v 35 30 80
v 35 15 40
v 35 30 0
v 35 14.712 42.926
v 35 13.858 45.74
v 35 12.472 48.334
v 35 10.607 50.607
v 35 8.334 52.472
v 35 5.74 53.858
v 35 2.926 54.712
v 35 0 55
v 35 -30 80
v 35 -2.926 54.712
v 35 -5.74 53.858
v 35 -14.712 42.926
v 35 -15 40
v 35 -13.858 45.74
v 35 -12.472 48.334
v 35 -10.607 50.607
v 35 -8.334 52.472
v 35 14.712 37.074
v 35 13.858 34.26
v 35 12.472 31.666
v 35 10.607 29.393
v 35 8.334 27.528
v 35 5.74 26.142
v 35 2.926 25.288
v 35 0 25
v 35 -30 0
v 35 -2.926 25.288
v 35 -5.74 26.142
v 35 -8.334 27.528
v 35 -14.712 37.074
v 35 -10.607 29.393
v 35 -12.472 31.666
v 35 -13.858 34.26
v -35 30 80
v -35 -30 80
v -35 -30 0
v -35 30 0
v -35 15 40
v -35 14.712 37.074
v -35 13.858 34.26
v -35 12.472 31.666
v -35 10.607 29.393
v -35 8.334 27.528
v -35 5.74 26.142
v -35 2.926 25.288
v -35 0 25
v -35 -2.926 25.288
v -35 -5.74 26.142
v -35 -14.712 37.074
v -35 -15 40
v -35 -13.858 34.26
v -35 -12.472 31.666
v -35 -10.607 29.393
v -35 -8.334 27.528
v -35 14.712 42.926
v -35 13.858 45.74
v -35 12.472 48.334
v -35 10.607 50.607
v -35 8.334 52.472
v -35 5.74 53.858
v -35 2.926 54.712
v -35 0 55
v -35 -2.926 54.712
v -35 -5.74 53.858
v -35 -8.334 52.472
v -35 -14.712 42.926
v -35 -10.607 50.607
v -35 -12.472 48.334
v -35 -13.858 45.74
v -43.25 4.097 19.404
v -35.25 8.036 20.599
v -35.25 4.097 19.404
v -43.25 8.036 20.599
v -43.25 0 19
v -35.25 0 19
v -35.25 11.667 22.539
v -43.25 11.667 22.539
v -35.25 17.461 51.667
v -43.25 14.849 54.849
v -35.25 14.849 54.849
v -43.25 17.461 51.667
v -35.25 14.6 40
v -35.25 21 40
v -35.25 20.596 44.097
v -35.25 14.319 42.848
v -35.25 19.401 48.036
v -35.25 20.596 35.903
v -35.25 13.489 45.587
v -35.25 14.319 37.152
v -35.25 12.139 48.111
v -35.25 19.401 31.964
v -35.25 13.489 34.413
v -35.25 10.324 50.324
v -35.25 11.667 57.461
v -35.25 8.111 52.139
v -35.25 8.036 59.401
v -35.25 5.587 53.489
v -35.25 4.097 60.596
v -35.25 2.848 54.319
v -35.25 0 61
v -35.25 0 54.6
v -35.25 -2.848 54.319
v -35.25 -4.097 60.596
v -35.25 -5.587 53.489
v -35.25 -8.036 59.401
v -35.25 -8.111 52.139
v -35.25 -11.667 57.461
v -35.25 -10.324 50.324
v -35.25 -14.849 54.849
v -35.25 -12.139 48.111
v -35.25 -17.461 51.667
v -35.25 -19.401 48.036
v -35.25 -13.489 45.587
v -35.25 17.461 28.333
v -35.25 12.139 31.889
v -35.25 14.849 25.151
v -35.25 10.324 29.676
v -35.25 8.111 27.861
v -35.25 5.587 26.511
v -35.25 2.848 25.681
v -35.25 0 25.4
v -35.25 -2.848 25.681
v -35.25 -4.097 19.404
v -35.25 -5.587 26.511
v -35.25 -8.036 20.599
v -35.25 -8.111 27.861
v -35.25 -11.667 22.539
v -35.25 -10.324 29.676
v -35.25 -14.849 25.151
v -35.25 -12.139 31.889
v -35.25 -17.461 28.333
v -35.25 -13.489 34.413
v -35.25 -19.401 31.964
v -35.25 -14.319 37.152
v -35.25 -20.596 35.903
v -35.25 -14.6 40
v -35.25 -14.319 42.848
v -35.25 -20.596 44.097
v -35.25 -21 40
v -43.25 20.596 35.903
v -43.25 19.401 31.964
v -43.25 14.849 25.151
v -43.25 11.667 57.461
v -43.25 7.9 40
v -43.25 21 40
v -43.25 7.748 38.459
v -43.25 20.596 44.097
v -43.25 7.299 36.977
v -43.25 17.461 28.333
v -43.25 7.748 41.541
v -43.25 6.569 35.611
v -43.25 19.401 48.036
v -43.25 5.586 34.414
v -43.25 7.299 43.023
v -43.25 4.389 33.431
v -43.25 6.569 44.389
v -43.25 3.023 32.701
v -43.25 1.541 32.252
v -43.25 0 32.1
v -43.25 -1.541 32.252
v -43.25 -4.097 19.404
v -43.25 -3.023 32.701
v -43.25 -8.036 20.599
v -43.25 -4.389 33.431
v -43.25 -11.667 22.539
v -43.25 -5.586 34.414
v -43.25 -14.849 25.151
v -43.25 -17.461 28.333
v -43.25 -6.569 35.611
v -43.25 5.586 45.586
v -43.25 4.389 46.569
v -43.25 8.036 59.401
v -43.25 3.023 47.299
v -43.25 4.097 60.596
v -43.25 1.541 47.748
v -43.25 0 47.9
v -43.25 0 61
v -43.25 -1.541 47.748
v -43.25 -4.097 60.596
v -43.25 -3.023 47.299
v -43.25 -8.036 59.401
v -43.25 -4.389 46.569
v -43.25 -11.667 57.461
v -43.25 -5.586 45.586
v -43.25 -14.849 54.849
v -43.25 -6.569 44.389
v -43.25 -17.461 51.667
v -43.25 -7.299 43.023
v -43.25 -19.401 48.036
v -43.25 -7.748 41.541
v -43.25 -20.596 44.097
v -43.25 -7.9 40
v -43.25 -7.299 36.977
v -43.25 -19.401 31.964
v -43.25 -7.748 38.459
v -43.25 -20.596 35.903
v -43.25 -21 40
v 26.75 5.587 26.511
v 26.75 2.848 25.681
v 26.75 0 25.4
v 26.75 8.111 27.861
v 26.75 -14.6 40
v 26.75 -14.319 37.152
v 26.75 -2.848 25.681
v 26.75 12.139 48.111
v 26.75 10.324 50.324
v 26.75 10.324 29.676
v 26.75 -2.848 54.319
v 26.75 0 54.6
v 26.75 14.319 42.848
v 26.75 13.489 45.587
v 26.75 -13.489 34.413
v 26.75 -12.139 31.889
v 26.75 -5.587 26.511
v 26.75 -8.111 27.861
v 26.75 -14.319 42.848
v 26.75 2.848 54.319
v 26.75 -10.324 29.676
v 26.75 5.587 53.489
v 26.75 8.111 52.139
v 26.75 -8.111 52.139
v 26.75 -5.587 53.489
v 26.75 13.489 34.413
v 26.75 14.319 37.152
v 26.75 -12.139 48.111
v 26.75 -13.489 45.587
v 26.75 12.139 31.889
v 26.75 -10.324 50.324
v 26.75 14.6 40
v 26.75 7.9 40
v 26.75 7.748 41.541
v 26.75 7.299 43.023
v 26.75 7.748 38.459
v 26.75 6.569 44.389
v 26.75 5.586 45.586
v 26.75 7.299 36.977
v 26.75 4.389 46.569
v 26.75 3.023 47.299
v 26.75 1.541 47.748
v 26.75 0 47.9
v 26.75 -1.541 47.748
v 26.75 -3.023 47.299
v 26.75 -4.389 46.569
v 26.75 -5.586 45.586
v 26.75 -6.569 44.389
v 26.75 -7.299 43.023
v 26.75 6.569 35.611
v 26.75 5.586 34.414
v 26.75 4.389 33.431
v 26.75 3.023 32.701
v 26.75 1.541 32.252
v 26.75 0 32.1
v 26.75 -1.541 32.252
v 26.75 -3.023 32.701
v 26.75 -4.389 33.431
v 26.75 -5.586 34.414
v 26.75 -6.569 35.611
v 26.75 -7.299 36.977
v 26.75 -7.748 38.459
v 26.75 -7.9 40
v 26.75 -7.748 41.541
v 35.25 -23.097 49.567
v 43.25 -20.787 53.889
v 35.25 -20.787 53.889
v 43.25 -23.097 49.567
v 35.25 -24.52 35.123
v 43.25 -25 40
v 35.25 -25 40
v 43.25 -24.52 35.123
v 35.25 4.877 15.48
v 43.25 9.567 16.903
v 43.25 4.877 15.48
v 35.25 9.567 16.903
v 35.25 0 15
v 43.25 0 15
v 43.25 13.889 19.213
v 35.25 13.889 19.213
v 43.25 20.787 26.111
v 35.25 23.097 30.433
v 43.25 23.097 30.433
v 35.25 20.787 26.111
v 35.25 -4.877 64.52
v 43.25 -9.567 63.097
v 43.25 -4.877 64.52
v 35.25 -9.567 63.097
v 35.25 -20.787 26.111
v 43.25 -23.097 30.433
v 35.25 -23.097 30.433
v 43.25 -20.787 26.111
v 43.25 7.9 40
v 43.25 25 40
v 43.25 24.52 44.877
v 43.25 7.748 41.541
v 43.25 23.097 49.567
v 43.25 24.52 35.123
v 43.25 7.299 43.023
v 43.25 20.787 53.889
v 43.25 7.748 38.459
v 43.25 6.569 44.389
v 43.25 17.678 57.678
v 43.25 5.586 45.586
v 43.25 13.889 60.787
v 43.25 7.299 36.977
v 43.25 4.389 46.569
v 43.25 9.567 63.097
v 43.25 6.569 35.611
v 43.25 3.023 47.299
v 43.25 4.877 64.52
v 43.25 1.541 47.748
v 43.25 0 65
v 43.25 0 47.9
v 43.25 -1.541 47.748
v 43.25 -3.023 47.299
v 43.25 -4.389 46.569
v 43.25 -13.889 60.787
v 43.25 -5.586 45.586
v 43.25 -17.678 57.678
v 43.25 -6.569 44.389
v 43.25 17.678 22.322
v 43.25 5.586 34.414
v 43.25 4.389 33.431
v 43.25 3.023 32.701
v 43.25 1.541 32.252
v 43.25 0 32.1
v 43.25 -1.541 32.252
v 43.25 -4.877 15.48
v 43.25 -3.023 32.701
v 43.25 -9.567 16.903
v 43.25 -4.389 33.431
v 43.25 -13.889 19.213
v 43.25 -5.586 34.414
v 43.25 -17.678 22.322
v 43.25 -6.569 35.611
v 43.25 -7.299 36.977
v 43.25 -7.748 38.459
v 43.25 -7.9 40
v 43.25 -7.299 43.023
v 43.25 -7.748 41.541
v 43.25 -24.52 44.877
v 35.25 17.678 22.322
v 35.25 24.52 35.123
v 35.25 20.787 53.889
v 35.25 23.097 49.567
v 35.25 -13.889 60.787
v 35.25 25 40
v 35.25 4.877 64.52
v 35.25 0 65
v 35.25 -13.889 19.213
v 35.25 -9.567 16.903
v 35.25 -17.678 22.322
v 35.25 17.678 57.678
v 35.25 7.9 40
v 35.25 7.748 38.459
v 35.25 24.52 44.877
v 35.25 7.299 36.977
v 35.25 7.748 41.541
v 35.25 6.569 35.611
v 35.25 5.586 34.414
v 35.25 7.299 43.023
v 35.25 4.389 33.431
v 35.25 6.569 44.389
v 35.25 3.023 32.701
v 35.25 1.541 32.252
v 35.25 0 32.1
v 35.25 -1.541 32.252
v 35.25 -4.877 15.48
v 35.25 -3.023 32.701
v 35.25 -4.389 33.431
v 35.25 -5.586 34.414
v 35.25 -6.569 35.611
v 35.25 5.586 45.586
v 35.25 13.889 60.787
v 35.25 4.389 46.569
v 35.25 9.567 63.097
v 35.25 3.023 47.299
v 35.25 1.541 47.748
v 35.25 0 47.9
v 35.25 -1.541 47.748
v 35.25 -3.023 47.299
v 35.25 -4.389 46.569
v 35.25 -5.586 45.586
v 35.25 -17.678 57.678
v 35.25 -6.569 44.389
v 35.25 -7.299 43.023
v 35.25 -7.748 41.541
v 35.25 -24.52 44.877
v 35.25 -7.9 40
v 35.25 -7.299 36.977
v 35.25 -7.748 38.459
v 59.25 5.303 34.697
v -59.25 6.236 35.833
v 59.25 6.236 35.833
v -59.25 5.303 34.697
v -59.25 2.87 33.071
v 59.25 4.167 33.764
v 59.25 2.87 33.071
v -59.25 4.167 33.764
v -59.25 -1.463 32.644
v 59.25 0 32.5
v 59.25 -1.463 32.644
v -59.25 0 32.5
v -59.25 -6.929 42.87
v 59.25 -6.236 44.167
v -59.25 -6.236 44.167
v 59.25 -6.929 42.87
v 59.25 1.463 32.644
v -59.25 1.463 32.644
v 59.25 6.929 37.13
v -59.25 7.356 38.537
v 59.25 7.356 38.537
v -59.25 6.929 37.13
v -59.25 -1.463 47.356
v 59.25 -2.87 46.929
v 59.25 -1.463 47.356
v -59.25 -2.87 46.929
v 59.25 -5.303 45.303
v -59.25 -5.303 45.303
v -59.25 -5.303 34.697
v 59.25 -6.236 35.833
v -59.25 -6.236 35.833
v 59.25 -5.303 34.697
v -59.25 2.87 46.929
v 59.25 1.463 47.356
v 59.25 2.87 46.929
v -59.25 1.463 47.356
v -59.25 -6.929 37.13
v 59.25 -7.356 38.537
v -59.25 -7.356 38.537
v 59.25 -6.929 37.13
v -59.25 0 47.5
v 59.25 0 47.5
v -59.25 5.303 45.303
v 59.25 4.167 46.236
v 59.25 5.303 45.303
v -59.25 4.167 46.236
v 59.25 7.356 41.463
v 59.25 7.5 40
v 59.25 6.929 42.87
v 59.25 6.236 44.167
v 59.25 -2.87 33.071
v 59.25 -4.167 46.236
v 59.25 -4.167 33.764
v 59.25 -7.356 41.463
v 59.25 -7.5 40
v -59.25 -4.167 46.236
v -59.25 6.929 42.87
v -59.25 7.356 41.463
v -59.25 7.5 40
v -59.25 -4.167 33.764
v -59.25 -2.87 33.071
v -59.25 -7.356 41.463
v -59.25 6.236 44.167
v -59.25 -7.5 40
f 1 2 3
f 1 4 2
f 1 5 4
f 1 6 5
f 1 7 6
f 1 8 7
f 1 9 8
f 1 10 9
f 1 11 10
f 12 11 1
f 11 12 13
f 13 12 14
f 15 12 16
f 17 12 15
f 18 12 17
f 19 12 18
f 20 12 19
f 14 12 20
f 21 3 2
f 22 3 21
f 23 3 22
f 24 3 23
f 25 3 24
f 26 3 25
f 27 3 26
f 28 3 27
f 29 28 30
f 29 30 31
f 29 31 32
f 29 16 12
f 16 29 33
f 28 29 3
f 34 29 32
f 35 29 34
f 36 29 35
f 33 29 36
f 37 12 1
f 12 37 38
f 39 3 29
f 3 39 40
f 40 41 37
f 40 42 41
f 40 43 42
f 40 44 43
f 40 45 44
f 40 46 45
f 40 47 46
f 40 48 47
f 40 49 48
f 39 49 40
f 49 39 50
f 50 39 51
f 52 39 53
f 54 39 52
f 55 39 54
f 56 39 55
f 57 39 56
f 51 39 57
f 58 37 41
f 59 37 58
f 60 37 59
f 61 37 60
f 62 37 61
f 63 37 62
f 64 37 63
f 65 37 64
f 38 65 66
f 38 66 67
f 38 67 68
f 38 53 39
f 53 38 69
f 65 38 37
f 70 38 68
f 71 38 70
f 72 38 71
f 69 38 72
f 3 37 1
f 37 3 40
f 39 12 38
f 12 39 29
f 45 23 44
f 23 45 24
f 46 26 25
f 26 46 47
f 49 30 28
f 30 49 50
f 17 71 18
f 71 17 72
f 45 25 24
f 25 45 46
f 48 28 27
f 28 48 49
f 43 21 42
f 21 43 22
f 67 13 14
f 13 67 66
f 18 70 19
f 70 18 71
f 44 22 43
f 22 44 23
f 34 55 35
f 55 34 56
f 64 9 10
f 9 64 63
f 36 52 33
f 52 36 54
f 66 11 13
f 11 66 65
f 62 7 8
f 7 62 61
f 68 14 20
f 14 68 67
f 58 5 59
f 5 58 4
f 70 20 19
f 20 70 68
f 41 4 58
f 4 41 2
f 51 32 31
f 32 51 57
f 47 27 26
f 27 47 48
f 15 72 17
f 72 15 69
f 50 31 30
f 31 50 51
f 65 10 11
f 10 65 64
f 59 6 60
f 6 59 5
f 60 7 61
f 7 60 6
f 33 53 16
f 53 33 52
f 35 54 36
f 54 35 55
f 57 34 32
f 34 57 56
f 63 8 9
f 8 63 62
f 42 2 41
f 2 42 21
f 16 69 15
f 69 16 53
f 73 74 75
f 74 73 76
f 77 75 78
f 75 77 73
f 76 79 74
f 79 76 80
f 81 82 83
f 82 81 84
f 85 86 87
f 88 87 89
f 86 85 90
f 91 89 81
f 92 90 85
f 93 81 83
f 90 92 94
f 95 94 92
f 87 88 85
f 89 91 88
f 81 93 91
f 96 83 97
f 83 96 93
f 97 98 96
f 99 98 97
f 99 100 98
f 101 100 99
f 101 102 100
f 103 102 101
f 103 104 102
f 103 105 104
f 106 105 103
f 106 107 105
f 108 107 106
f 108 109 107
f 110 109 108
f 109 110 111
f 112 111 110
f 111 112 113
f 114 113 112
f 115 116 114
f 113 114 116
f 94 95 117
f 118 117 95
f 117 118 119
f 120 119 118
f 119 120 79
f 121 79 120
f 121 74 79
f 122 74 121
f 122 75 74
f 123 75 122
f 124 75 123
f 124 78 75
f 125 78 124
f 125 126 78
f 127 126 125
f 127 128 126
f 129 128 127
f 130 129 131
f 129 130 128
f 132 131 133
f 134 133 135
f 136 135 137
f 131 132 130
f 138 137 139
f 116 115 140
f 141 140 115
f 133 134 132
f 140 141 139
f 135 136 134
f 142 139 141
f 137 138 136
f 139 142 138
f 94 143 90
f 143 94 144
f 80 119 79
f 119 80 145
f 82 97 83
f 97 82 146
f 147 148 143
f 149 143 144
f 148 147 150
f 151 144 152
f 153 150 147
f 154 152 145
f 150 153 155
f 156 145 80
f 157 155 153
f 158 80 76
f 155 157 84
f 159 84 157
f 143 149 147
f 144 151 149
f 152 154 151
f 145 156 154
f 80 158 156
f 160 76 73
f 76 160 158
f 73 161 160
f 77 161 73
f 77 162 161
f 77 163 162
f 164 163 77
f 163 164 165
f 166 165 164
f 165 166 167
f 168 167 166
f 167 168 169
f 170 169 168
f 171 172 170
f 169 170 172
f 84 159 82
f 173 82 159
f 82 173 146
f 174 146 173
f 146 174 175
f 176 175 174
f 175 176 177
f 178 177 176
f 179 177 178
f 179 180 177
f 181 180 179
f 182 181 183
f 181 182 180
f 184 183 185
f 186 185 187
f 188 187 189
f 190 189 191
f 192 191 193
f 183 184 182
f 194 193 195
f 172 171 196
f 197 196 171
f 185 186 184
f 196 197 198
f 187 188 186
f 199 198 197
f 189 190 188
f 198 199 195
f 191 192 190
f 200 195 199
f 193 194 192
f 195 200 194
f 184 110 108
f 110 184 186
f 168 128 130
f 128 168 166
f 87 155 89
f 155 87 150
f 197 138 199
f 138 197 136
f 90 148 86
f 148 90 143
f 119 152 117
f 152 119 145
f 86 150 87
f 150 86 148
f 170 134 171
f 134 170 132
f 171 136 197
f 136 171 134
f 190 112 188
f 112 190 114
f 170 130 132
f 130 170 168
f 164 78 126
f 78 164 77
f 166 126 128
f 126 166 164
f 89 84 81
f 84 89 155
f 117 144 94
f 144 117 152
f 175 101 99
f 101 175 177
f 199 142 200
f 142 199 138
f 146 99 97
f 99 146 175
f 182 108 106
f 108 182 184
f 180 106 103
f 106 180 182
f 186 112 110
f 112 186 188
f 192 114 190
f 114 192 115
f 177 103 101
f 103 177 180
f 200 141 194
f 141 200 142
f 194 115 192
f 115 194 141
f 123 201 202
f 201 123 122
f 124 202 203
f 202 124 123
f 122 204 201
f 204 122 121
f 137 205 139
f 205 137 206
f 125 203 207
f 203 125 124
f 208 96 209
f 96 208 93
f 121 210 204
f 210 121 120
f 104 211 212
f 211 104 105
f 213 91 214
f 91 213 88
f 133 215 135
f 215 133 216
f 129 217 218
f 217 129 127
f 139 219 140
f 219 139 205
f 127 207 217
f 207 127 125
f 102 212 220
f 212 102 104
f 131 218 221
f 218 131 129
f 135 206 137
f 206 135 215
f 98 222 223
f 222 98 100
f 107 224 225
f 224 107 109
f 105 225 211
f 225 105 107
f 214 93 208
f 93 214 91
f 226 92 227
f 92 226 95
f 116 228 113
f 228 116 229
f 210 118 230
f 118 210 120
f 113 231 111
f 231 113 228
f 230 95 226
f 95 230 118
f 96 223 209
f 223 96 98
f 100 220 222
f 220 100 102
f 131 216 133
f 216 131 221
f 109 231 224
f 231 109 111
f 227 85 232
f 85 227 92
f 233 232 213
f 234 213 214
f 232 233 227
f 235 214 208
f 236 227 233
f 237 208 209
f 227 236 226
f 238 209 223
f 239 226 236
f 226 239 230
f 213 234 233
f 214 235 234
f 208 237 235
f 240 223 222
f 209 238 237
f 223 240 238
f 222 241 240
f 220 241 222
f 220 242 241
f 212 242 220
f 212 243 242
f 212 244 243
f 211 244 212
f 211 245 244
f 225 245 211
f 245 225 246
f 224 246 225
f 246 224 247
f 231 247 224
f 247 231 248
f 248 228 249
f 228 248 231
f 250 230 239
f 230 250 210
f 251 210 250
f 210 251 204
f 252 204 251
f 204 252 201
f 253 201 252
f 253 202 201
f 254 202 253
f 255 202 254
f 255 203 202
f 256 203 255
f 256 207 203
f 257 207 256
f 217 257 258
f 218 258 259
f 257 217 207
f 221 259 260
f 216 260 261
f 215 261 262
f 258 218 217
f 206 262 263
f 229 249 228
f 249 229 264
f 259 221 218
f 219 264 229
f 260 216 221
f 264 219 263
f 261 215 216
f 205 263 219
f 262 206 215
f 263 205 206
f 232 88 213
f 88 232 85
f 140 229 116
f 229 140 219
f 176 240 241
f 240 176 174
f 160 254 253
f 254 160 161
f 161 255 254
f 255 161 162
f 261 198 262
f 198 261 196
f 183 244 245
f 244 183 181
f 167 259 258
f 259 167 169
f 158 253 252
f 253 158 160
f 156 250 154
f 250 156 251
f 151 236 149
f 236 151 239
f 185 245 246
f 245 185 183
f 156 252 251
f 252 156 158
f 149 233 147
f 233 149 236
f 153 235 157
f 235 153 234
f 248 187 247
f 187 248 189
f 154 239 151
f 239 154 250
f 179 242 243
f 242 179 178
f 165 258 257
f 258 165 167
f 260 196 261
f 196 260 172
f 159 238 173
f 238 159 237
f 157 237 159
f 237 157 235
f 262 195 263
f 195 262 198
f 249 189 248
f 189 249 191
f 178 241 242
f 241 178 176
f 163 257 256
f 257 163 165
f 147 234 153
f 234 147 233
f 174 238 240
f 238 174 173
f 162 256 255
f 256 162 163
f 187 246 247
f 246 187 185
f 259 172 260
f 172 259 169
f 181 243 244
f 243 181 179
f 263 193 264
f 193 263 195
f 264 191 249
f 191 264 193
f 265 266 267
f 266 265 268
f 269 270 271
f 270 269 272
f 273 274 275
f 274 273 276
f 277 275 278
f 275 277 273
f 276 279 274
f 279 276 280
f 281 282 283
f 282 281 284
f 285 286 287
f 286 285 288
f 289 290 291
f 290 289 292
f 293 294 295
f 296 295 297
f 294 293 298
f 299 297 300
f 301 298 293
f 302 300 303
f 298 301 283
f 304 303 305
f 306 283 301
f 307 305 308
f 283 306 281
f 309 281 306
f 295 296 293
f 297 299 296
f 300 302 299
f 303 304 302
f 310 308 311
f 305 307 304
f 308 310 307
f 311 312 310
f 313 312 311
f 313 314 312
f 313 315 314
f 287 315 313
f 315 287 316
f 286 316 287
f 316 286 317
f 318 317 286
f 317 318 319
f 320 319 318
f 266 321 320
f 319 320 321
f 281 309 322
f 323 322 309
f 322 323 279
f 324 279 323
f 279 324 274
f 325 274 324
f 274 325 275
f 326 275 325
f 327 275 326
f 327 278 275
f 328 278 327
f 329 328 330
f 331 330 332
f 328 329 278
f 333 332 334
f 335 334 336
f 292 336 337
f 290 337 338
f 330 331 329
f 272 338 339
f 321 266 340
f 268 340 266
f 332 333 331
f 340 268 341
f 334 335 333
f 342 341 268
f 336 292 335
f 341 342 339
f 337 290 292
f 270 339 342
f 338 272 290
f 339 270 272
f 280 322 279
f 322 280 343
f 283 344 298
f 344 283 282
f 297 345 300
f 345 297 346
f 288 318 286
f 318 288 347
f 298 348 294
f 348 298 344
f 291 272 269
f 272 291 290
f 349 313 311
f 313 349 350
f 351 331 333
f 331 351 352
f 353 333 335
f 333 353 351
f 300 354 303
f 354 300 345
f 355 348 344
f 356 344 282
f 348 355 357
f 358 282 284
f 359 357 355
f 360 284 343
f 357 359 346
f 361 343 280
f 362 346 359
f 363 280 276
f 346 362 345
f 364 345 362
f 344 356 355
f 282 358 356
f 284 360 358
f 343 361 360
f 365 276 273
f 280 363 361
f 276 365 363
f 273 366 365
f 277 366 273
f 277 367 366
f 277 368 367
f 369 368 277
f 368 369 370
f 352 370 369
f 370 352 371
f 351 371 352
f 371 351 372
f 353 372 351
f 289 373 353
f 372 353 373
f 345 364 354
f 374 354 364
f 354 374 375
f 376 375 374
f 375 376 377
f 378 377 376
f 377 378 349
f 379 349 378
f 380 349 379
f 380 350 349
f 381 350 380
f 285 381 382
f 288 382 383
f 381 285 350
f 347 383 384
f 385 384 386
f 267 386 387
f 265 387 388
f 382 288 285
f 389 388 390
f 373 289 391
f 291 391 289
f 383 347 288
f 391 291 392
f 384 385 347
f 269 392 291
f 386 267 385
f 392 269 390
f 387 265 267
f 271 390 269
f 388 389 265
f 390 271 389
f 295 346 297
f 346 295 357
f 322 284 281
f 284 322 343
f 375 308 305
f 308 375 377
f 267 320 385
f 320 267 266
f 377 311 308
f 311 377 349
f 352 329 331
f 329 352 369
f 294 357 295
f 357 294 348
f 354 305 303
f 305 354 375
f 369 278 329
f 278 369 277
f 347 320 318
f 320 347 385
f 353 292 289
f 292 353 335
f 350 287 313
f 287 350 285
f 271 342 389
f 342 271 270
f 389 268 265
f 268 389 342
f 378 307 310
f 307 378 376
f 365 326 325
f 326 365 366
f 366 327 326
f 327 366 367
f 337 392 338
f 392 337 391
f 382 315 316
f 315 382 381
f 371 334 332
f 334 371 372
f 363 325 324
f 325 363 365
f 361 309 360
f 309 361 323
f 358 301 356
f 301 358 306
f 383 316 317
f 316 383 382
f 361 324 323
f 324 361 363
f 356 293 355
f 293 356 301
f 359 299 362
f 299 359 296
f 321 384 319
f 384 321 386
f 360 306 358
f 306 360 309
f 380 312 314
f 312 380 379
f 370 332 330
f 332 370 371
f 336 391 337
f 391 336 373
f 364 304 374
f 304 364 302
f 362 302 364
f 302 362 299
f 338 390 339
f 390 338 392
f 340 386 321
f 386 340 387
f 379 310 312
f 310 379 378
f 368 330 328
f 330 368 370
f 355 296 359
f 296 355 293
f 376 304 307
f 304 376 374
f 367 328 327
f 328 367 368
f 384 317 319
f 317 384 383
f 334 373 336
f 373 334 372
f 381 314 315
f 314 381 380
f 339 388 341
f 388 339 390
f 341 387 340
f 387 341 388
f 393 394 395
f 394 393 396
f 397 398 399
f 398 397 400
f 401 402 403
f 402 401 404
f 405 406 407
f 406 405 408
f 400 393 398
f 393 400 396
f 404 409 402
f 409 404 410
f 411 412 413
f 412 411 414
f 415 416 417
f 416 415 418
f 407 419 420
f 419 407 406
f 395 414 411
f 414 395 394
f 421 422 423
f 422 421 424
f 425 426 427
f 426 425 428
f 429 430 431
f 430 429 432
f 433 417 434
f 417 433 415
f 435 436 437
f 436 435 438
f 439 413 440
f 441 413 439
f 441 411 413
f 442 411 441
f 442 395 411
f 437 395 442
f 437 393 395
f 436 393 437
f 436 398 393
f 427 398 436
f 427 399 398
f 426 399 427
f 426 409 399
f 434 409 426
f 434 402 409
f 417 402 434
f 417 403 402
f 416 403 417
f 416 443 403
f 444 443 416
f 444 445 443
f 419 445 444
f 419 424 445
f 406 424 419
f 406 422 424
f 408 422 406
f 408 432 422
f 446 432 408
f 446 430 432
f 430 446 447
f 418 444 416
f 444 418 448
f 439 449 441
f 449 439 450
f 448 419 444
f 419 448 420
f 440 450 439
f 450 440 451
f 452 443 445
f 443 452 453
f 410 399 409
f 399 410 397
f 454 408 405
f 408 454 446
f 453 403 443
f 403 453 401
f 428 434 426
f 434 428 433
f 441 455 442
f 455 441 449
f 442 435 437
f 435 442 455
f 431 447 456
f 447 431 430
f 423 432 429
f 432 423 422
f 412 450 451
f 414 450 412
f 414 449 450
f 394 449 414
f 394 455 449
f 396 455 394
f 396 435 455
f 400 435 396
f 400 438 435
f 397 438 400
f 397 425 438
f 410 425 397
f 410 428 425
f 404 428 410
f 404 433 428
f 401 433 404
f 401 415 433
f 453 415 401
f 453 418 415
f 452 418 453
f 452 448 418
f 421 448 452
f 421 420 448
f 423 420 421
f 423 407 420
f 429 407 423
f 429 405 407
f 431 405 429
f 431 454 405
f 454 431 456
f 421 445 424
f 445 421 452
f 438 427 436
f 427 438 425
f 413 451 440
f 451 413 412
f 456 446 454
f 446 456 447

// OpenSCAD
$fn = 32;

// ------------------------------------------------------------------------
// Bushed housing: 70 x 60 x 80 mm housing, bushing d29.2
// Every part is its own module, assembly() places them once.
// ------------------------------------------------------------------------

// --- part 1 ---
module housing() {
  difference() {
    translate([-35, -30, 0]) cube([70, 60, 80]);
    translate([0, 0, 40]) rotate([0, 90, 0]) cylinder(h = 72, d = 30, center = true);
  }
}

// --- part 2 ---
module bushing() {
  difference() {
    union() {
      cylinder(h = 8, d = 42);
      translate([0, 0, 8]) cylinder(h = 62, d = 29.2);
    }
    translate([0, 0, -1]) cylinder(h = 72, d = 15.8);
  }
}

// --- part 3 ---
module shaft() {
  translate([0, 0, -59.25]) cylinder(h = 118.5, d = 15);
}

// --- part 4 ---
module cover() {
  difference() {
    cylinder(h = 8, d = 50);
    translate([0, 0, -1]) cylinder(h = 10, d = 15.8);
  }
}

// --- assembly ---
module assembly() {
  translate([0, 0, 0]) rotate([0, 0, 0]) housing();
  translate([-43.25, 0, 40]) rotate([0, 90, 0]) bushing();
  translate([0, 0, 40]) rotate([0, 90, 0]) shaft();
  translate([35.25, 0, 40]) rotate([0, 90, 0]) cover();
}

assembly();
